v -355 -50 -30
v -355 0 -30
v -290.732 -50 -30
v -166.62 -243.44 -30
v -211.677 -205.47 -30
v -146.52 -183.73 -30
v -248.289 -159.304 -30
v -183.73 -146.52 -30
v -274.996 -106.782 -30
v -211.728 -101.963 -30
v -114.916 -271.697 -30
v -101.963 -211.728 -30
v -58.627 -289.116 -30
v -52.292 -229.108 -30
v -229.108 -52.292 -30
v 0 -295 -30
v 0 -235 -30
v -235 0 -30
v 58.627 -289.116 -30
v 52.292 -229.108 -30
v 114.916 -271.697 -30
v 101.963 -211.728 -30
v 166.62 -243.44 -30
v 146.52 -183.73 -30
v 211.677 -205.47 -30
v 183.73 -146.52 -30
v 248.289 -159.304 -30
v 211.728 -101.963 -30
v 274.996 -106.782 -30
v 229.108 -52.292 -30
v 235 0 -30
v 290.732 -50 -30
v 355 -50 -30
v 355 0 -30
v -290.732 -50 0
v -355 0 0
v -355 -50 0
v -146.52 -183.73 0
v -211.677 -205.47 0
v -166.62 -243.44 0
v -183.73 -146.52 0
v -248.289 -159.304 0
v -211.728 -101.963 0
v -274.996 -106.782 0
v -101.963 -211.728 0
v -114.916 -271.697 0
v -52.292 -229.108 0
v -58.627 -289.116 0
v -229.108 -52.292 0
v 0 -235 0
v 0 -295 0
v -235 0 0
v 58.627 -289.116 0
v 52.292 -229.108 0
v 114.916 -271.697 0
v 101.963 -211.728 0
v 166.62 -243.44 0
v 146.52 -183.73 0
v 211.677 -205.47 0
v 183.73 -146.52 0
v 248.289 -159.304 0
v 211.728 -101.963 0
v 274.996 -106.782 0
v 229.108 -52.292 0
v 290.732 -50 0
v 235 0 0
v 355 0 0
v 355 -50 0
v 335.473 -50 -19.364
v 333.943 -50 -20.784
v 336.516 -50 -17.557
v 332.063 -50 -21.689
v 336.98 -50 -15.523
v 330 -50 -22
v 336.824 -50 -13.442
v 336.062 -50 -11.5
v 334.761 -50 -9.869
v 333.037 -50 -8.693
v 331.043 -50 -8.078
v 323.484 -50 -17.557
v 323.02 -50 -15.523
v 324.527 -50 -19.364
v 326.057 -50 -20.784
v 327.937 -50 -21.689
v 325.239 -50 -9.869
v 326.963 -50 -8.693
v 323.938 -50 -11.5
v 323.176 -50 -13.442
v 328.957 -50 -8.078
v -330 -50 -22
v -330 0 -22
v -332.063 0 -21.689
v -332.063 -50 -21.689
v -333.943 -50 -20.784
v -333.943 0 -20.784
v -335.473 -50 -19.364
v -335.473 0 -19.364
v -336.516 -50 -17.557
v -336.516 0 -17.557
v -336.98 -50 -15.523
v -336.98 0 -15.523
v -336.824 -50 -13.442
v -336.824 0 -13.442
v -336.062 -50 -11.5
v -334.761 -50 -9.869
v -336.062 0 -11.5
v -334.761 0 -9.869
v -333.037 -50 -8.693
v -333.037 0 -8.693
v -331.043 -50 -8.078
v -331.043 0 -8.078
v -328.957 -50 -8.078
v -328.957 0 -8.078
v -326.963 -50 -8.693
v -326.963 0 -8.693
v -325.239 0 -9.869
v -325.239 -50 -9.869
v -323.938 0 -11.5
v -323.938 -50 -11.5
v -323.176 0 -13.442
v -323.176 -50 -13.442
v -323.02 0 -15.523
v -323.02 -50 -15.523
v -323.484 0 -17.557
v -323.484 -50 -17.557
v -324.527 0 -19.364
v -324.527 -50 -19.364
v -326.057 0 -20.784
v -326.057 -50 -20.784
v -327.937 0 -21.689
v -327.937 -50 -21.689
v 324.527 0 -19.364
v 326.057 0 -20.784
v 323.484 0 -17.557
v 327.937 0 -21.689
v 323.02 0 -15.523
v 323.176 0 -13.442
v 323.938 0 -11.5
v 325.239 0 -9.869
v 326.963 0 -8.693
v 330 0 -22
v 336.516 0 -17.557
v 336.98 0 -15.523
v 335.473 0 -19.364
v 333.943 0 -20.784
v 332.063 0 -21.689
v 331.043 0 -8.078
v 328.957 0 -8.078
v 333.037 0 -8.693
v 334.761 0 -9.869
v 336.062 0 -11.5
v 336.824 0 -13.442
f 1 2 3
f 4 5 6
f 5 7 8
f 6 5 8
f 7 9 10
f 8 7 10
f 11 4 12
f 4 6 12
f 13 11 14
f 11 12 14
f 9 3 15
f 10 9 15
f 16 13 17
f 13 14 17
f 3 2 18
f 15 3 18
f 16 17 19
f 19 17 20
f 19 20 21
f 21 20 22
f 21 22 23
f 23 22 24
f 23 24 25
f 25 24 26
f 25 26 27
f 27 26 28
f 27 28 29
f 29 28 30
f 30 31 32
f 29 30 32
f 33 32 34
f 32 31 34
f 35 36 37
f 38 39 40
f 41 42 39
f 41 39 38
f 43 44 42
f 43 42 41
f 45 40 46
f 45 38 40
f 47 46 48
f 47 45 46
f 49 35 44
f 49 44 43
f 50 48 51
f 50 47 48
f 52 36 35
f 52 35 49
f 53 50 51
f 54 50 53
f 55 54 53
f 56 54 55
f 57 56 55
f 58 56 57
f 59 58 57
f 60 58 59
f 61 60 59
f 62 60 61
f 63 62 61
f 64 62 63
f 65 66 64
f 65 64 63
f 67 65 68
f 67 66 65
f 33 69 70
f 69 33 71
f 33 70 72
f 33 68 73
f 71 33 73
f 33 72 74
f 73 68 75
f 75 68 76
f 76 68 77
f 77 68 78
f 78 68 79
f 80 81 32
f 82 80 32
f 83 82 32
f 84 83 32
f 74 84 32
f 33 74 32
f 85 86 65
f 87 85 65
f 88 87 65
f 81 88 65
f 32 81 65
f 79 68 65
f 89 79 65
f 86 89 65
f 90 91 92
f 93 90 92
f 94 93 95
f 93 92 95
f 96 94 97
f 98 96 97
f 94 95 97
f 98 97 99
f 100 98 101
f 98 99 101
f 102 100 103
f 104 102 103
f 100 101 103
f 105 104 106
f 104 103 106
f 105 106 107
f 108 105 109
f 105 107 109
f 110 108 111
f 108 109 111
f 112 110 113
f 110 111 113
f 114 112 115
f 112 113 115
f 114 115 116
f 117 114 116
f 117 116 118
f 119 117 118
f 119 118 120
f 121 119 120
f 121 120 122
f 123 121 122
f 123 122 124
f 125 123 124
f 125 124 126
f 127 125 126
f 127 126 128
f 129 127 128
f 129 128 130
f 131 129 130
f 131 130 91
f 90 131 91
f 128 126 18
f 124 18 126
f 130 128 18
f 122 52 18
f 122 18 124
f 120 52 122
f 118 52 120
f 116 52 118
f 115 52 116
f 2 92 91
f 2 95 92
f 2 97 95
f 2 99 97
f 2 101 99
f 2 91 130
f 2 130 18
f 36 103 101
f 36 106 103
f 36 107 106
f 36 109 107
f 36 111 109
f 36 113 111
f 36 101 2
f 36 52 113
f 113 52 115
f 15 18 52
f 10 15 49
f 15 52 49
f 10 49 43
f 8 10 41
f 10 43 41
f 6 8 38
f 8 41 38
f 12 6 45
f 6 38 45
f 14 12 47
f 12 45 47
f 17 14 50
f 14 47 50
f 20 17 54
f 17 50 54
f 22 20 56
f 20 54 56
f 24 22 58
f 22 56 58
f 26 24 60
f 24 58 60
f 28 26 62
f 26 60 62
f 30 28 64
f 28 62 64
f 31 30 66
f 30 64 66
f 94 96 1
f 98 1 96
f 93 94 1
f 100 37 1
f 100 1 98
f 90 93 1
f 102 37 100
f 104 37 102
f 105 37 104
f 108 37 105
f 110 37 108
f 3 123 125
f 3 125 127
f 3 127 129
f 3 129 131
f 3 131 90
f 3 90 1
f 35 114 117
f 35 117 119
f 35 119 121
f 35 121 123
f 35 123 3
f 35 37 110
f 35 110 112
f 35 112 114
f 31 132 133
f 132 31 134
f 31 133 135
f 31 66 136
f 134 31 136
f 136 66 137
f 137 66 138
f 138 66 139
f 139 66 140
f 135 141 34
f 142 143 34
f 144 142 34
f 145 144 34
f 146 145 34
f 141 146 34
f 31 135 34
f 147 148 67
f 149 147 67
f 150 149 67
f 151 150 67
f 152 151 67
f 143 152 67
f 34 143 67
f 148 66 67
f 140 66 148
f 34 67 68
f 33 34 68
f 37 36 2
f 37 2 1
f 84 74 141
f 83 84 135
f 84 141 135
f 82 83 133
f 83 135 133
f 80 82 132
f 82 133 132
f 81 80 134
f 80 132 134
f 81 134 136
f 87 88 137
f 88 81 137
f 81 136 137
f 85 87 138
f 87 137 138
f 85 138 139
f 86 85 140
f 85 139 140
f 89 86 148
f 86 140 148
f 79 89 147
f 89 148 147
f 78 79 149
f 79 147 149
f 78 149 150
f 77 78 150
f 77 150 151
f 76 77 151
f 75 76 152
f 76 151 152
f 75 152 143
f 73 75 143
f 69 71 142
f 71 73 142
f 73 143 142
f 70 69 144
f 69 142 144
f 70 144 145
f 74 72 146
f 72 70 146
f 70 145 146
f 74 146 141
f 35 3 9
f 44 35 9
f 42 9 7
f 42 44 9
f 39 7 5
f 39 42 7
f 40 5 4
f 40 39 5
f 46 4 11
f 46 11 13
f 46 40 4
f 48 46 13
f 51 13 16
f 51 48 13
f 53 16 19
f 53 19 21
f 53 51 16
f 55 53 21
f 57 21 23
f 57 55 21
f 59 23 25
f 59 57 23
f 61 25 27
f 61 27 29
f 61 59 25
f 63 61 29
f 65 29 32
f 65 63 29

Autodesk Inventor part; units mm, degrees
ref_plane "YZ Plane" through (0, 0, 0) normal (1, 0, 0) x (0, 1, 0)
ref_plane "XZ Plane" through (0, 0, 0) normal (0, 1, 0) x (-1, 0, 0)
ref_plane "XY Plane" through (0, 0, 0) normal (0, 0, 1) x (1, 0, 0)
sketch "Sketch1" plane through (0, 0, 0) normal (0, 0, 1) x (1, 0, 0)
  circle A0 centre (0, 0) radius 265 construction
  line L0 (0, 265) -> (0, 295) construction
  line L1 (0, 265) -> (0, 235) construction
  circle A1 centre (0, 0) radius 235
  circle A2 centre (0, 0) radius 295
  line L2 (-235, 0) -> (-235, 80)
  line L3 (-235, 80) -> (-295, 80)
  line L4 (-295, 80) -> (-295, 0)
  line L5 (235, 0) -> (235, 80)
  line L6 (235, 80) -> (295, 80)
  line L7 (295, 80) -> (295, 0)
  line L8 (-235, 0) -> (-295, 0)
  line L9 (-295, 0) -> (-355, 0)
  line L10 (-355, 0) -> (-355, -50)
  line L11 (-355, -50) -> (-290.7318, -50)
  line L12 (235, 0) -> (295, 0)
  line L13 (295, 0) -> (355, 0)
  line L14 (355, 0) -> (355, -50)
  line L15 (355, -50) -> (290.7318, -50)
  dimension "d13" = 530
  dimension "d26" = 80
  dimension "d36" = 60
  dimension "d40" = 60
  dimension "d41" = 50
extrude "Extrusion1" add sketch "Sketch1" against normal blind 30 contours L12 A2 L8 A1 | L13 L14 L15 A2 | A2 L11 L10 L9
sketch "Sketch4" plane through (0, 0, 0) normal (0, 0, 1) x (1, 0, 0)
  line L0 (0, 0) -> (51.6989, -259.9081) construction
  line L1 (0, 0) -> (0, -276.8337) construction
  dimension "d27" = 265
  dimension "d35" = 11.25
sketch "Sketch7" plane through (0, 0, 0) normal (0, 0, 1) x (1, 0, 0)
  line L0 (-355, -50) -> (-355, 0) construction
  line L1 (-355, -25) -> (355, -25) construction
  line L2 (355, 0) -> (355, -50) construction
  point P0 (0, 0)
  point P1 (-330, -25)
  dimension "d42" = 25
fillet "Fillet2" [suppressed]
hole "Hole1" [suppressed]
hole "Hole2" [suppressed]
pattern_circular "Circular Pattern4" [suppressed]
sketch "Sketch8" plane through (-355, -50, -30) normal (0, -1, 0) x (1, 0, 0)
  line L0 (0, 30) -> (0, 0) projected
  point P0 (355, 30)
  point P1 (25, 15)
  point P2 (0, 15)
  dimension "d63" = 25
hole "Hole3" at (-330, -50, -15) direction (0, 1, 0) diameter 14 end through all
mirror "Mirror1" about plane through (0, 0, 0) normal (1, 0, 0) of "Hole3"
equation "\"d13\" = Шпил_пласт_КОРМА_диам_центров"
equation "\"d40\" = d36"
equation "\"d27\" = 0.5 * Шпил_пласт_КОРМА_диам_центров"
equation "\"BendReliefDepth\" = 0.5 * Thickness"
equation "\"Шпил_пласт_КОРМА_диам_центров\" = 530"
equation "\"Thickness\" = 30"
properties part number "Постель 201 зад_CPY"
